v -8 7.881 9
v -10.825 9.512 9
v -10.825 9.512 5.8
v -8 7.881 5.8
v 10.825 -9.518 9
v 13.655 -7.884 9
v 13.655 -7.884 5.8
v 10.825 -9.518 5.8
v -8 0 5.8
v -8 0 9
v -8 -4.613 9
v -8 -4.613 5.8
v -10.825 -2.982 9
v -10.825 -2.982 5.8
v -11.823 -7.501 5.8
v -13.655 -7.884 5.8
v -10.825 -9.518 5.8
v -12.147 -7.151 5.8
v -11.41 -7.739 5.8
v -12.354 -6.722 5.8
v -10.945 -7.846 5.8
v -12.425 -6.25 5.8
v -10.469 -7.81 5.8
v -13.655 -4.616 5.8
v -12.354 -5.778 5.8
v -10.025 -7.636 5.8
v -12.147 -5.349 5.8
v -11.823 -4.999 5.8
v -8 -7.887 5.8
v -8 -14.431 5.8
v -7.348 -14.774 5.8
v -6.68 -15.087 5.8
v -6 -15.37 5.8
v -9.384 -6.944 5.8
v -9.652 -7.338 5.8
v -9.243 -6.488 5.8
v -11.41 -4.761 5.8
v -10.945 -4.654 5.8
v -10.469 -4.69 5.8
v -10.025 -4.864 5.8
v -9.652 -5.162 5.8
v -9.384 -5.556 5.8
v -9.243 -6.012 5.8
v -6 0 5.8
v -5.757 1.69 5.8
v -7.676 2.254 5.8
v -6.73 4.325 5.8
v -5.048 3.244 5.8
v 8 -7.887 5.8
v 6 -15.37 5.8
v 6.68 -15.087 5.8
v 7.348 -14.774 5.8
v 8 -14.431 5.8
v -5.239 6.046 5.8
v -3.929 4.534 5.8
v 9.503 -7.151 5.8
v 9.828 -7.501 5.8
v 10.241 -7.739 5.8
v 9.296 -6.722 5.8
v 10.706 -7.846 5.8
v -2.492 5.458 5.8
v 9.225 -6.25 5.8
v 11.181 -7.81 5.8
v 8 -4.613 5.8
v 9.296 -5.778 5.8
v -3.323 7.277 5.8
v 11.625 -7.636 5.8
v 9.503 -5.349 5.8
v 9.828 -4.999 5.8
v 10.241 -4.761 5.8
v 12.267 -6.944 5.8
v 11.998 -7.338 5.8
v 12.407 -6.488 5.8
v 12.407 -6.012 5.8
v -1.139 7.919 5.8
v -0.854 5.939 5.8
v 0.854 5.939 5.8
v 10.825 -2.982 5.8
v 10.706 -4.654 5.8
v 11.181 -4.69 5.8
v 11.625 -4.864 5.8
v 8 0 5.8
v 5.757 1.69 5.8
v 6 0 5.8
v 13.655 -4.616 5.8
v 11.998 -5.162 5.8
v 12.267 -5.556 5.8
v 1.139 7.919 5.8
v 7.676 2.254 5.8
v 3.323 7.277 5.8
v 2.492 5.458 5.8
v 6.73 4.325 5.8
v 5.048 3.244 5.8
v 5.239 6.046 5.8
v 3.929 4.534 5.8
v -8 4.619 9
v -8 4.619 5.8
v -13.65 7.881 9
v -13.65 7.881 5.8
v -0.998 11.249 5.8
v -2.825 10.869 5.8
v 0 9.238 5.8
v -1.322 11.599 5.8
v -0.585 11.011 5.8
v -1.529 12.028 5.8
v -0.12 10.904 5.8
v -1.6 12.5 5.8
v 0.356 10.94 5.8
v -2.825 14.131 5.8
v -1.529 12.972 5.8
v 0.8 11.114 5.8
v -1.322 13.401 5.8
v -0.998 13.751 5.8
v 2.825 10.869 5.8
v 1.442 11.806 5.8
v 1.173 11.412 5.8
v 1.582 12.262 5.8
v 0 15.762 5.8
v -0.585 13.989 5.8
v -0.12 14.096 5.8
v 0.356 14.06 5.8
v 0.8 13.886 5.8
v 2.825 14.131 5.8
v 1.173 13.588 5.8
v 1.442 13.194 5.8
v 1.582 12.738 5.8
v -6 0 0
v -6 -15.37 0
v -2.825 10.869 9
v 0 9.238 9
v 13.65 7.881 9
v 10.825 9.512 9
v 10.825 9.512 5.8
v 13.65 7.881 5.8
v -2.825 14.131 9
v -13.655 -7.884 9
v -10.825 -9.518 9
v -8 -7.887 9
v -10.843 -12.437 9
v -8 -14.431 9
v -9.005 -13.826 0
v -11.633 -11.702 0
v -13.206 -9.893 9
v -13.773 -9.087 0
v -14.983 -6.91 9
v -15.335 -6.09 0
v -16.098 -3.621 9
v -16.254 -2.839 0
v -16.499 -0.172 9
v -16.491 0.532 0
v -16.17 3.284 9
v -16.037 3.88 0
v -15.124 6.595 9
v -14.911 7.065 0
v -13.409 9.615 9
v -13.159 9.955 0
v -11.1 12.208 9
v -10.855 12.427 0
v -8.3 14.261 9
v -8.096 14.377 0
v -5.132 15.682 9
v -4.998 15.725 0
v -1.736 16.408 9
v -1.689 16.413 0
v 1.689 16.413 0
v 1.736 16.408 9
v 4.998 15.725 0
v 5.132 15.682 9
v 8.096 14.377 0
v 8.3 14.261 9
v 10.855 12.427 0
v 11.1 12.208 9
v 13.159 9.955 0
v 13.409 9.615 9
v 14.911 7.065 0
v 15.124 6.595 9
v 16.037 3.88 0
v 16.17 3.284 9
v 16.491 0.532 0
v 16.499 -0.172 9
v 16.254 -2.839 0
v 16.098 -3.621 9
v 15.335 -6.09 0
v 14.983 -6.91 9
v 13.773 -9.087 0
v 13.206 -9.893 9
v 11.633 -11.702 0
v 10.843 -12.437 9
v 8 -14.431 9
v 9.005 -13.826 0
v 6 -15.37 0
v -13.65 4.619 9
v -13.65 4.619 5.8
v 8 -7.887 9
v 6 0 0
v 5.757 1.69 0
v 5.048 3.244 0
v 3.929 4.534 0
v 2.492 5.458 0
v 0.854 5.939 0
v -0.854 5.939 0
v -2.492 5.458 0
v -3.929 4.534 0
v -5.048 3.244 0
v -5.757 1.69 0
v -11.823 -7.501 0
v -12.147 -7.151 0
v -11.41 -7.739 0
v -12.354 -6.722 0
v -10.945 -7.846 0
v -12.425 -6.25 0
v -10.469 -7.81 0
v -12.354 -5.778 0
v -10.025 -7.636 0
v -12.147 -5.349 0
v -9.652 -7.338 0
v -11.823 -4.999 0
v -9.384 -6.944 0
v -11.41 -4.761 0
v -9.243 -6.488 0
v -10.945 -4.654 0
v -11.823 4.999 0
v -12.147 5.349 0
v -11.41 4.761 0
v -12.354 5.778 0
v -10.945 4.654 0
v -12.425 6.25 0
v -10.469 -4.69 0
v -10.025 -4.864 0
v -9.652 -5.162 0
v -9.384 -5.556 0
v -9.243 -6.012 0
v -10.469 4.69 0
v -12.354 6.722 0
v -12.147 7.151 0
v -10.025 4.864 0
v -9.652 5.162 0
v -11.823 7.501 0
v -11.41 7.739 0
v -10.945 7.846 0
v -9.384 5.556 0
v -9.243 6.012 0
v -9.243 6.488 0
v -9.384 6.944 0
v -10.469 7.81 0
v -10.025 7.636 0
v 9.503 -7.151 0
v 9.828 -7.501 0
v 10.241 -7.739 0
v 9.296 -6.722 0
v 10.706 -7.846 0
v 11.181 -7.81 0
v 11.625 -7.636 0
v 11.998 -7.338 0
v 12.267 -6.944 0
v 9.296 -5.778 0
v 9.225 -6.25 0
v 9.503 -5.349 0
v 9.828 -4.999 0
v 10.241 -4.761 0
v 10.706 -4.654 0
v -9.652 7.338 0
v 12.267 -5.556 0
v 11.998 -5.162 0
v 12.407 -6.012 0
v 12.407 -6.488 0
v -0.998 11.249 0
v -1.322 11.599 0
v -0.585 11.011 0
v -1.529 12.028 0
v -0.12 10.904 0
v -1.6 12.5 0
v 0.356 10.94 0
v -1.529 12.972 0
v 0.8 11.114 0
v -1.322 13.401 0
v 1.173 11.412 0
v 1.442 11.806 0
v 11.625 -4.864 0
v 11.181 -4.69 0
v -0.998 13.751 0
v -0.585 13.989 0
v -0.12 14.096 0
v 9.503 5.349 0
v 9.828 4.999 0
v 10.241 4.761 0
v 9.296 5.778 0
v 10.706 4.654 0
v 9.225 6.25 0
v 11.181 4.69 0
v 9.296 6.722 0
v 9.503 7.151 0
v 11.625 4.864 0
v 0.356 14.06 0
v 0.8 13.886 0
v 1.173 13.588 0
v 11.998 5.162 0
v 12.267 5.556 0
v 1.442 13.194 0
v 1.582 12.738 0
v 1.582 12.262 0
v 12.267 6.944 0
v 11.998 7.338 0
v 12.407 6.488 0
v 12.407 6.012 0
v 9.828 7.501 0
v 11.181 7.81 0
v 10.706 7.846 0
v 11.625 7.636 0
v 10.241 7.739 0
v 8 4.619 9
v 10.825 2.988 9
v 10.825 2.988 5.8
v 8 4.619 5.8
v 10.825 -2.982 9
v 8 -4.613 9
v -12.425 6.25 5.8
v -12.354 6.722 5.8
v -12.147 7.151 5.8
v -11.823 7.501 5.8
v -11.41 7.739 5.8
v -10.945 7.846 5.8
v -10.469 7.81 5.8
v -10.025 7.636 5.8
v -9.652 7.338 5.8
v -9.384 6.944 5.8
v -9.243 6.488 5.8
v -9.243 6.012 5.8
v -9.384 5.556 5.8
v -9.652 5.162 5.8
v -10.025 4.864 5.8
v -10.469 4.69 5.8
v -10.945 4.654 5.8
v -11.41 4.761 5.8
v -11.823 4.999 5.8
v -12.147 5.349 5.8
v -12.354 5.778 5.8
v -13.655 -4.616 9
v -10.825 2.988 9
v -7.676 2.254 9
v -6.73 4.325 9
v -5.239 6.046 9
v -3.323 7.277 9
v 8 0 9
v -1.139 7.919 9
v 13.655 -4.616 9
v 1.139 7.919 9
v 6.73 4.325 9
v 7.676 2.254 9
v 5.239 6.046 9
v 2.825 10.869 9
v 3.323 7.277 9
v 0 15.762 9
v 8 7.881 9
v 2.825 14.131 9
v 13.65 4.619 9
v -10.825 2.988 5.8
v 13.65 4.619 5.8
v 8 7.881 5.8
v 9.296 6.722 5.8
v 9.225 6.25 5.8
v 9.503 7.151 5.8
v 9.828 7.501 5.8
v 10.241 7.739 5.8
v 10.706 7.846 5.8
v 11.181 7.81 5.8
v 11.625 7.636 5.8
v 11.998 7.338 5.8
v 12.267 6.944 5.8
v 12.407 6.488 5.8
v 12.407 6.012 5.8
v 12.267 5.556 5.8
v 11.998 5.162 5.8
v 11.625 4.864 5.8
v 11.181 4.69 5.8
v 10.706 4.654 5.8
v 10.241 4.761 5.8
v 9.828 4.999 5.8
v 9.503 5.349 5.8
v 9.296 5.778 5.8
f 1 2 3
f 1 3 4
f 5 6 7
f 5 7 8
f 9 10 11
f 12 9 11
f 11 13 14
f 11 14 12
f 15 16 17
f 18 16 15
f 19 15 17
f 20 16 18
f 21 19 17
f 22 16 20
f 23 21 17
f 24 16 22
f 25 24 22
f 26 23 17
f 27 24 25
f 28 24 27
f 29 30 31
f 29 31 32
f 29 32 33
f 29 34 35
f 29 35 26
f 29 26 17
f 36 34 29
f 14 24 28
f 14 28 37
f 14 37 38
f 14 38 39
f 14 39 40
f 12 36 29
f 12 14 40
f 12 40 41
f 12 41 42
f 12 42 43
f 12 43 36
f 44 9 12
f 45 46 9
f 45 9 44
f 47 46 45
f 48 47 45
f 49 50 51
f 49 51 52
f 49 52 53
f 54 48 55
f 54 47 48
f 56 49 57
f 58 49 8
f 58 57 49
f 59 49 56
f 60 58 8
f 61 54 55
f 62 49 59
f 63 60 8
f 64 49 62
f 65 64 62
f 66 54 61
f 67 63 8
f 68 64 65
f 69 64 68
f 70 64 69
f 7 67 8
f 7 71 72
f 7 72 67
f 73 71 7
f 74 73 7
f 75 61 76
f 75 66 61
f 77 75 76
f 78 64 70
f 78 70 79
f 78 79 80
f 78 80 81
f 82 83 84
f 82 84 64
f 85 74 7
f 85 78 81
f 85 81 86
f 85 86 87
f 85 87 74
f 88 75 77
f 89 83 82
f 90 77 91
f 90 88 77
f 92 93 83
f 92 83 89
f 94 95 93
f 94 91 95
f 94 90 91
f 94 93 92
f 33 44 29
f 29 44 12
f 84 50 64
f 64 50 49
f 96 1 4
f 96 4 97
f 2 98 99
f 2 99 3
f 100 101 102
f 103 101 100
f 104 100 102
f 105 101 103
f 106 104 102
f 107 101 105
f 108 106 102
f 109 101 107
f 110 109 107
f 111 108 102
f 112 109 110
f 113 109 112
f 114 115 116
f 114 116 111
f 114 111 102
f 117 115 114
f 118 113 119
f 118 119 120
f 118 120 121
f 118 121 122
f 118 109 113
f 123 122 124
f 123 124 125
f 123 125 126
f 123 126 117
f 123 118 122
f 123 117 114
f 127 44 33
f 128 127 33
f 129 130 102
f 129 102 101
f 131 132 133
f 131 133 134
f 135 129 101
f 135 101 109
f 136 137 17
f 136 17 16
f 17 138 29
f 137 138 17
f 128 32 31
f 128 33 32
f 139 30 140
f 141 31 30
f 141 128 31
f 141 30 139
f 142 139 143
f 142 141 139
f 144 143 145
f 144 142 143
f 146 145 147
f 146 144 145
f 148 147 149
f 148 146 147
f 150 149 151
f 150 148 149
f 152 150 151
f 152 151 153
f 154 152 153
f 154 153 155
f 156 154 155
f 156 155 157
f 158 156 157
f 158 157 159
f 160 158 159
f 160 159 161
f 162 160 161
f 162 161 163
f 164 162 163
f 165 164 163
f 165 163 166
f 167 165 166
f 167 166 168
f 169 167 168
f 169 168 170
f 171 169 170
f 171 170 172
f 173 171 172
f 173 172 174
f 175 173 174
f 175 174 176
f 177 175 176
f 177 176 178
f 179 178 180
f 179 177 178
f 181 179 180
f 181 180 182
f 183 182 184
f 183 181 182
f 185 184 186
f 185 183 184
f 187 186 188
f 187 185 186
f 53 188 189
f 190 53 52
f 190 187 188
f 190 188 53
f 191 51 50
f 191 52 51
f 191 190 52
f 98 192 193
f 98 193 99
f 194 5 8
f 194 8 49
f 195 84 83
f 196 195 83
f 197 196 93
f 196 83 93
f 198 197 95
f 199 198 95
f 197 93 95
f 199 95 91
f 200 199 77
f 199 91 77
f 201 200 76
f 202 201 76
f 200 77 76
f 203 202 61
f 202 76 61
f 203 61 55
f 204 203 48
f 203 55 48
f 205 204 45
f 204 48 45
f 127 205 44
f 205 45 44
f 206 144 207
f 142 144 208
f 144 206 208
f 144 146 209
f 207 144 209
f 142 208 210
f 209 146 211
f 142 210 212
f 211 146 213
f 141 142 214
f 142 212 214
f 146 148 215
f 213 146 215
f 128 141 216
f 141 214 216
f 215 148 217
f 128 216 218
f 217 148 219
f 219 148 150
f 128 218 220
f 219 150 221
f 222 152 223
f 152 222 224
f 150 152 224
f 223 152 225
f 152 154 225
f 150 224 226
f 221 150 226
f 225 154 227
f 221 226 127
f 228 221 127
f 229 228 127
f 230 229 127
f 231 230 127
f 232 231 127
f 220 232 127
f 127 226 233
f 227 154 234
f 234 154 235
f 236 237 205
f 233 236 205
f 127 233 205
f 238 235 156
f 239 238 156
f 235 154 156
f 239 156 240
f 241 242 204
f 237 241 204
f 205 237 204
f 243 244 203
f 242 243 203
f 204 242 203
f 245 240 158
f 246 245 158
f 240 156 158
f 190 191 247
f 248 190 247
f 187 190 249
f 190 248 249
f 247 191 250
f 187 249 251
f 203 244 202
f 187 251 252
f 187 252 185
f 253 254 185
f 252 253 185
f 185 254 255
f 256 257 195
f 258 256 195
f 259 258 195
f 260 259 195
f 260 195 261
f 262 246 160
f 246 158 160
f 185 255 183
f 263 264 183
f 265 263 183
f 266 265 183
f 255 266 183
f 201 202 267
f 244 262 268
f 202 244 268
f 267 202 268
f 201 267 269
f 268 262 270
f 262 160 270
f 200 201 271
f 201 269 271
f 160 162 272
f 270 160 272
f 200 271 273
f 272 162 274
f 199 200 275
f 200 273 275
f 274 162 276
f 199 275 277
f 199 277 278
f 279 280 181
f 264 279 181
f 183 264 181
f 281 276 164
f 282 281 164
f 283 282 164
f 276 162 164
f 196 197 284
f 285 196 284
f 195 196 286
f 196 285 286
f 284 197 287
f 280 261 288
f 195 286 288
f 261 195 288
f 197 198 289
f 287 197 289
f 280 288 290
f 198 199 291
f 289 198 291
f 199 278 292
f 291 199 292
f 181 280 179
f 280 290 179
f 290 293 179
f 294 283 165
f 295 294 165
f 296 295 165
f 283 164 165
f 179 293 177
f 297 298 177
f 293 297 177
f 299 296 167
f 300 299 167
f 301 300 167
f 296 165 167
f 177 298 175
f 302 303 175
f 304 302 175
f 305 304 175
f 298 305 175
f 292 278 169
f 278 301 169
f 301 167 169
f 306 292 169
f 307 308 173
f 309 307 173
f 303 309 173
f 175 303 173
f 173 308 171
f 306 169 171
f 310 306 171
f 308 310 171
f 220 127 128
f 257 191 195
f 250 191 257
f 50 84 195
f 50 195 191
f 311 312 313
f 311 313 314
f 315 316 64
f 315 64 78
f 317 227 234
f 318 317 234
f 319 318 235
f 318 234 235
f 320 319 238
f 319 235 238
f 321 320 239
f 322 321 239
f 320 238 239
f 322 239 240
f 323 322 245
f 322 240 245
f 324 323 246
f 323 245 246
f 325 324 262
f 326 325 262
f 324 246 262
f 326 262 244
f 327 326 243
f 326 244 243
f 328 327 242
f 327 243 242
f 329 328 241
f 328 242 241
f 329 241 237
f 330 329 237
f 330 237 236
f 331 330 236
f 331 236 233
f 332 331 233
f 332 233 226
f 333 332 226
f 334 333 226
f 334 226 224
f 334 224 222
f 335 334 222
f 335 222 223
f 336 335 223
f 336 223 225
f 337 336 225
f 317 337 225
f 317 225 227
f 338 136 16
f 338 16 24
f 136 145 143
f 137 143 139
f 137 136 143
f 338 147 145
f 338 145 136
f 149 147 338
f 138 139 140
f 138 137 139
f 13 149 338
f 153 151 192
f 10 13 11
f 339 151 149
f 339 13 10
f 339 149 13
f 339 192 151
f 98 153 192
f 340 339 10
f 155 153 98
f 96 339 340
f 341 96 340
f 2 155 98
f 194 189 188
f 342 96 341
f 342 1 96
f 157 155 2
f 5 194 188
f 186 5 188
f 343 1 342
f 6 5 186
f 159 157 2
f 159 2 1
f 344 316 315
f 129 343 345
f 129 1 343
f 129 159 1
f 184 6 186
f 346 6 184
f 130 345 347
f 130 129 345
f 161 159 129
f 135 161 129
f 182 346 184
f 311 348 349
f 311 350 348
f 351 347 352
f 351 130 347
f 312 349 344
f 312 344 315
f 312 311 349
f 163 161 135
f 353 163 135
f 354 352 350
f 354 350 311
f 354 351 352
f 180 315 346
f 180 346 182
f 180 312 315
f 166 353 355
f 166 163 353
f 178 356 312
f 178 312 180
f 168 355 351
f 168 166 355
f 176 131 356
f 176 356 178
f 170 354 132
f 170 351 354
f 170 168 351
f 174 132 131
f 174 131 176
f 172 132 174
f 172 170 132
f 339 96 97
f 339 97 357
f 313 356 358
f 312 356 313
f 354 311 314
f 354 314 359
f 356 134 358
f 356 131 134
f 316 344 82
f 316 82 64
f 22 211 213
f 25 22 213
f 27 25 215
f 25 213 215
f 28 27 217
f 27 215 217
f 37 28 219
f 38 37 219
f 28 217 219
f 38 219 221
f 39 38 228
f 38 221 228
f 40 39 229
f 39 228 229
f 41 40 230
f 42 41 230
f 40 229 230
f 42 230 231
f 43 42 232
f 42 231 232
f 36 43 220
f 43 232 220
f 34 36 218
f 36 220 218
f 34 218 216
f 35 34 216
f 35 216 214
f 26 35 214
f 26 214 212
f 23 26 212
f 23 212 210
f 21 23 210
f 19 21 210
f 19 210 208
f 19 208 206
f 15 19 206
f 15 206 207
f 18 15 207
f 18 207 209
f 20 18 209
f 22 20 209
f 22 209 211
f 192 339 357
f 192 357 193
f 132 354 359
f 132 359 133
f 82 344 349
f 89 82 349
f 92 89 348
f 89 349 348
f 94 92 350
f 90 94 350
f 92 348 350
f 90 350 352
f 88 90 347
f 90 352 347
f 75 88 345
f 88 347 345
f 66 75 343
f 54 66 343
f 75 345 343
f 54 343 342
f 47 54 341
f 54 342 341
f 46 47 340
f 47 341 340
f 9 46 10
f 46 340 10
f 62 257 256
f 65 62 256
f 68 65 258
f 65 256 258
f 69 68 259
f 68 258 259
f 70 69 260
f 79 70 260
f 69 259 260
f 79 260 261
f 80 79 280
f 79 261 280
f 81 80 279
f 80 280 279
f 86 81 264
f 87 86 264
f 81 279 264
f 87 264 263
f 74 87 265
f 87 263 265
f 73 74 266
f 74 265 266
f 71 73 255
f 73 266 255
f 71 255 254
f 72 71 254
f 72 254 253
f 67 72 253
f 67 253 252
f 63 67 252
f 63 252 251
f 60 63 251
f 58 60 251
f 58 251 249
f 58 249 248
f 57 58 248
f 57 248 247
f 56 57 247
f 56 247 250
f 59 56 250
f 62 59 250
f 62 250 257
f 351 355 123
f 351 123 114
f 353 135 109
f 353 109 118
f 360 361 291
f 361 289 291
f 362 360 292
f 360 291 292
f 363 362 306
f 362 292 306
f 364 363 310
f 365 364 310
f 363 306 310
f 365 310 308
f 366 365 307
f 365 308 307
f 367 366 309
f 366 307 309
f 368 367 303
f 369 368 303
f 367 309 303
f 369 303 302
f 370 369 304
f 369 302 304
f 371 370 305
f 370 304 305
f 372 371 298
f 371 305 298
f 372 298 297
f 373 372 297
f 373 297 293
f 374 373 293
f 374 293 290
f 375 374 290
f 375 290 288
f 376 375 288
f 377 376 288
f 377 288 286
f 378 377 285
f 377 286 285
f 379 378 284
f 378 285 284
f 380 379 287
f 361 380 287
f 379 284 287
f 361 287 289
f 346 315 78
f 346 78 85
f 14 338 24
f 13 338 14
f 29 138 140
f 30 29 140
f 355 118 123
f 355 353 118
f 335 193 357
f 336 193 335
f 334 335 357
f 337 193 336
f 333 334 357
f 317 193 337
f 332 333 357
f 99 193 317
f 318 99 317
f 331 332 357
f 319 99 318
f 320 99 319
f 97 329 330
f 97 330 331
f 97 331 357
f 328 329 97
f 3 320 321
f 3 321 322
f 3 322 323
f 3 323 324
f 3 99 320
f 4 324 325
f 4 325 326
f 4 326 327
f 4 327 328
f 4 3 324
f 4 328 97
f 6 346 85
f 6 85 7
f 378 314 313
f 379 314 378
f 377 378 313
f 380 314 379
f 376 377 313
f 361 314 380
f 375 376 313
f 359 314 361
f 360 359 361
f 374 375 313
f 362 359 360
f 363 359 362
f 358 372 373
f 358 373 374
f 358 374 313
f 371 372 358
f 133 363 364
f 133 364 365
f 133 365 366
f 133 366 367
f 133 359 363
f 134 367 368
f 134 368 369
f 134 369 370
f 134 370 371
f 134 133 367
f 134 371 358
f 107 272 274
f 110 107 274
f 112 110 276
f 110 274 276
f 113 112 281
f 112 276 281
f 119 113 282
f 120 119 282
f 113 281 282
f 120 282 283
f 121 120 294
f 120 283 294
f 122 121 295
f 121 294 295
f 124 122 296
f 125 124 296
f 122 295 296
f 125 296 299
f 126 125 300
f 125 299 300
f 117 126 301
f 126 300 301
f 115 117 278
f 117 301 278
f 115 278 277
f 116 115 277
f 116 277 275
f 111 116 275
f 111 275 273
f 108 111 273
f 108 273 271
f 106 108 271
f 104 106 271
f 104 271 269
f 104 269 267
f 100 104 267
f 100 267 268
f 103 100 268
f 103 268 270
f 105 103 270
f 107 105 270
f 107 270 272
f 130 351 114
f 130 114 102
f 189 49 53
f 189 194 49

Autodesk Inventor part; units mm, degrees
ref_plane "YZ Plane" through (0, 0, 0) normal (1, 0, 0) x (0, 1, 0)
ref_plane "XZ Plane" through (0, 0, 0) normal (0, 1, 0) x (-1, 0, 0)
ref_plane "XY Plane" through (0, 0, 0) normal (0, 0, 1) x (1, 0, 0)
sketch "Sketch1" plane through (0, 0, 0) normal (0, 0, 1) x (1, 0, 0)
  circle A0 centre (0, 0) radius 16.5
  dimension "d0" = 33
extrude "Body" add sketch "Sketch1" along normal blind 9
sketch "Sketch2" plane through (0, 0, 9) normal (0, 0, 1) x (1, 0, 0)
  circle A0 centre (0, 0) radius 16.5 projected
  circle A1 centre (0, 0) radius 6
  line L0 (-6, 0) -> (-6, -15.3704)
  line L1 (6, 0) -> (6, -15.3704)
  arc A2 (-6, -15.3704) -> (6, -15.3704) centre (0, 0) ccw
  dimension "d3" = 12
extrude "Main Cutout" cut sketch "Sketch2" against normal blind 9 contours L0 A1 L1 A0 | A1 picked at (0.2411, -12.9009)
sketch "Sketch4" plane through (0, 0, 9) normal (0, 0, 1) x (1, 0, 0)
  line L0 (6, 0) -> (6, -15.3704) projected
  arc A0 (6, -15.3704) -> (-6, -15.3704) centre (0, 0) ccw projected
  line L1 (-6, -15.3704) -> (-6, 0) projected
  arc A1 (6, 0) -> (-6, 0) centre (0, 0) ccw projected
  circle A2 centre (0, 0) radius 8
  line L2 (-8, 0) -> (-8, -14.4309)
  line L3 (8, 0) -> (8, -14.4309)
  arc A3 (-8, -14.4309) -> (8, -14.4309) centre (0, 0) ccw
  dimension "d7" = 16
extrude "Bottom Cutout" cut sketch "Sketch4" against normal blind 3.2 contours A1 L1 A2 L0 | A2 L3 A0 L0 | L1 A0 L2 A2 picked at (-6.3631, -2.9996)
sketch "Sketch7" plane through (0, 0, 0) normal (0, 0, -1) x (-1, 0, 0)
  arc A0 (6, 0) -> (-6, 0) centre (0, 0) ccw projected
  arc A1 (6, -15.3704) -> (-6, -15.3704) centre (0, 0) ccw projected
  circle A2 centre (0, 0) radius 12.5 construction
  circle A3 centre (0, 12.5) radius 1.6
  circle A4 centre (-10.8253, 6.25) radius 1.6
  circle A5 centre (-10.8253, -6.25) radius 1.6
  circle A6 centre (0, -12.5) radius 1.6
  circle A7 centre (10.8253, -6.25) radius 1.6
  circle A8 centre (10.8253, 6.25) radius 1.6
  dimension "d18" = 25
  dimension "d19" = 3.2
  dimension "d22" = 360
extrude "M3 Holes" cut sketch "Sketch7" against normal blind 7 contours A3 | A4 | A5 | A7 | A8
sketch "Sketch8" plane through (0, 0, 9) normal (0, 0, 1) x (1, 0, 0)
  arc A0 (8, 0) -> (-8, 0) centre (0, 0) ccw projected
  circle A1 centre (0, 0) radius 12.5 construction
  circle A2 centre (0, 12.5) radius 1.5 construction
  circle A3 centre (-10.8253, 6.25) radius 1.5 construction
  circle A4 centre (-10.8253, -6.25) radius 1.5 construction
  circle A5 centre (0, -12.5) radius 1.5 construction
  circle A6 centre (10.8253, -6.25) radius 1.5 construction
  circle A7 centre (10.8253, 6.25) radius 1.5 construction
  line L0 (0, 9.238) -> (-2.825, 10.869)
  line L1 (-2.825, 10.869) -> (-2.825, 14.131)
  line L2 (-2.825, 14.131) -> (0, 15.762)
  line L3 (0, 15.762) -> (2.825, 14.131)
  line L4 (2.825, 14.131) -> (2.825, 10.869)
  line L5 (2.825, 10.869) -> (0, 9.238)
  line L6 (-10.8253, 2.988) -> (-13.6503, 4.619)
  line L7 (-13.6503, 4.619) -> (-13.6503, 7.881)
  line L8 (-13.6503, 7.881) -> (-10.8253, 9.512)
  line L9 (-10.8253, 9.512) -> (-8.0003, 7.881)
  line L10 (-8.0003, 7.881) -> (-8.0003, 4.619)
  line L11 (-8.0003, 4.619) -> (-10.8253, 2.988)
  line L12 (10.8253, 2.988) -> (8.0003, 4.619)
  line L13 (8.0003, 4.619) -> (8.0003, 7.881)
  line L14 (8.0003, 7.881) -> (10.8253, 9.512)
  line L15 (10.8253, 9.512) -> (13.6503, 7.881)
  line L16 (13.6503, 7.881) -> (13.6503, 4.619)
  line L17 (13.6503, 4.619) -> (10.8253, 2.988)
  line L18 (-10.8253, -9.5178) -> (-13.6553, -7.8839)
  line L19 (-13.6553, -7.8839) -> (-13.6553, -4.6161)
  line L20 (-13.6553, -4.6161) -> (-10.8253, -2.9822)
  line L21 (-10.8253, -2.9822) -> (-7.9953, -4.6161)
  line L22 (-7.9953, -4.6161) -> (-7.9953, -7.8839)
  line L23 (-7.9953, -7.8839) -> (-10.8253, -9.5178)
  line L24 (10.8253, -9.5178) -> (7.9953, -7.8839)
  line L25 (7.9953, -7.8839) -> (7.9953, -4.6161)
  line L26 (7.9953, -4.6161) -> (10.8253, -2.9822)
  line L27 (10.8253, -2.9822) -> (13.6553, -4.6161)
  line L28 (13.6553, -4.6161) -> (13.6553, -7.8839)
  line L29 (13.6553, -7.8839) -> (10.8253, -9.5178)
  dimension "d26" = 25
  dimension "d27" = 3
  dimension "d30" = 360
  dimension "d32" = 5.65
  dimension "d33" = 5.65
  dimension "d34" = 5.65
  dimension "d35" = 5.66
  dimension "d36" = 5.66
extrude "M3 Nut Traps" cut sketch "Sketch8" against normal blind 3.2
sketch "Sketch9" plane through (0, 0, 9) normal (0, 0, 1) x (1, 0, 0)
  line L0 (-8, -7.8866) -> (-10.8253, -9.5178) projected
  line L1 (-10.8253, -9.5178) -> (-13.6553, -7.8839) projected
  line L2 (-13.6553, -7.8839) -> (-13.6553, -4.6161) projected
  line L3 (-13.6553, -4.6161) -> (-10.8253, -2.9822) projected
  line L4 (-10.8253, -2.9822) -> (-8, -4.6134) projected
  line L5 (-8, -4.6134) -> (-8, 0) projected
  arc A0 (8, 0) -> (-8, 0) centre (0, 0) ccw projected
  line L6 (8, 0) -> (8, -4.6134) projected
  line L7 (8, -4.6134) -> (10.8253, -2.9822) projected
  line L8 (10.8253, -2.9822) -> (13.6553, -4.6161) projected
  line L9 (13.6553, -4.6161) -> (13.6553, -7.8839) projected
  line L10 (13.6553, -7.8839) -> (10.8253, -9.5178) projected
  line L11 (10.8253, -9.5178) -> (8, -7.8866) projected
  line L12 (8, -7.8866) -> (8, -14.4309) projected
  arc A1 (8, -14.4309) -> (-8, -14.4309) centre (0, 0) ccw projected
  line L13 (-8, -14.4309) -> (-8, -7.8866) projected
  line L14 (13.6503, 4.619) -> (10.8253, 2.988) projected
  line L15 (10.8253, 2.988) -> (8.0003, 4.619) projected
  line L16 (8.0003, 4.619) -> (8.0003, 7.881) projected
  line L17 (8.0003, 7.881) -> (10.8253, 9.512) projected
  line L18 (10.8253, 9.512) -> (13.6503, 7.881) projected
  line L19 (13.6503, 7.881) -> (13.6503, 4.619) projected
  line L20 (2.825, 10.869) -> (0, 9.238) projected
  line L21 (0, 9.238) -> (-2.825, 10.869) projected
  line L22 (-2.825, 10.869) -> (-2.825, 14.131) projected
  line L23 (-2.825, 14.131) -> (0, 15.762) projected
  line L24 (0, 15.762) -> (2.825, 14.131) projected
  line L25 (2.825, 14.131) -> (2.825, 10.869) projected
  line L26 (-8.0003, 4.619) -> (-10.8253, 2.988) projected
  line L27 (-10.8253, 2.988) -> (-13.6503, 4.619) projected
  line L28 (-13.6503, 4.619) -> (-13.6503, 7.881) projected
  line L29 (-13.6503, 7.881) -> (-10.8253, 9.512) projected
  line L30 (-10.8253, 9.512) -> (-8.0003, 7.881) projected
  line L31 (-8.0003, 7.881) -> (-8.0003, 4.619) projected
properties part number "Kossel E3D V6 Mount"
